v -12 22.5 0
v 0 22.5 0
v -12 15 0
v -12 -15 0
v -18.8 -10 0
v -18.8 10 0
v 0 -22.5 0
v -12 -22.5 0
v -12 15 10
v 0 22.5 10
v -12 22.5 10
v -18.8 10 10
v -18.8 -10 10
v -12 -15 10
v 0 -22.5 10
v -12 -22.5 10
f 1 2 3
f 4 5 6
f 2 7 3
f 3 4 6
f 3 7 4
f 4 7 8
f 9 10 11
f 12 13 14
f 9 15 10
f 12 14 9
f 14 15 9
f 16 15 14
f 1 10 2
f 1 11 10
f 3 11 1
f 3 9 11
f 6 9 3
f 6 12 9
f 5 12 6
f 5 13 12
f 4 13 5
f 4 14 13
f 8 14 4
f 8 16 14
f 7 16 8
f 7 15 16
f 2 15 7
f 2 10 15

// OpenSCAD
// file: dimensions.scad
//      +---------------------+
//      |                     |
//      |                     |
//      |                     |
//      |                     |
//      |                     |
//      |                     |
//      |                     |
//      |                     |
//      |                     |
//      |                     |
//   ^  |                     |
//   |  |                     |
//   Y  |                     |
//   |  |                     |
//   |  |                     |
//      +---------------------+
//       --  X (depth) --> 
// 

// the depth of the main body
depth = 11;

// the depth of the latch plate
latch_plate_depth = 3.25;

// the width of the enclosure for the human door side
hd_enclosure_width = 45;

// the depth of the enclosure for the human door side
hd_enclosure_depth = 10 * 2.5 + latch_plate_depth - 6;

// the width of the indoor overhang
overhang_indoor_width = 6;

// the width of the outdoor overhang
overhang_outdoor_width = 6;

// the total height
total_height = 50; // 290

// the width of the enclosure for the pet door side
pd_enclosure_width = 20 - 0.5;

// the depth of the enclosure for the pet door side
pd_enclosure_depth = 10;

seal_floor_offset = 12;
seal_small_width = 20;
seal_large_width = 30;
seal_depth = 6.8;

// the height of the track inset area
track_height = 18;

// the diameter of the track
track_diameter = 7;

// the height of the overhang
overhang_height = total_height - track_height;

// the total width
total_width = hd_enclosure_width + overhang_indoor_width + overhang_outdoor_width;

screw_body_clearance = 4.5;
screw_head_clearance = 9;
screw_body_depth = 10;
screw_angle_depth = 3;

// pins
pin_diameter = 5;
pin_length = 5;
// main file
include <dimensions.scad>

module full_seal3(l=20, falloff=false) {
  x0 = 0;
  x1 = -seal_floor_offset;
  x2 = -(seal_depth + seal_floor_offset);

  y0 = -seal_small_width / 2;
  y1 = seal_small_width / 2;
  y2 = -seal_large_width / 2;
  y3 = seal_large_width / 2;
  y4 = -hd_enclosure_width / 2;
  y5 = hd_enclosure_width / 2;

  z0 = 0;
  z1 = l;

  function zofx(x) = falloff ? 0 : z1;
  function xend(x) = falloff ? 1 : x;
  
  polyhedron(points=[[x0, y4, z0],
                     [x1, y4, z0],
                     [x1, y2, z0],
                     [x2, y0, z0],
                     [x2, y1, z0],
                     [x1, y3, z0],
                     [x1, y5, z0],
                     [x0, y5, z0],
                     [x0, y4, z1],
                     [x1, y4, z1],
                     [x1, y2, z1],
                     [x2, y0, z1],
                     [x2, y1, z1],
                     [x1, y3, z1],
                     [x1, y5, z1],
                     [x0, y5, z1]],
             faces=[
                    // extrusion faces
                    []
                    ]);
}

module full_seal(l=20, falloff=false) {
  x0 = 0;
  x1 = -seal_floor_offset;
  x2 = -(seal_depth + seal_floor_offset);

  y0 = -seal_small_width / 2;
  y1 = seal_small_width / 2;
  y2 = -seal_large_width / 2;
  y3 = seal_large_width / 2;
  y4 = -hd_enclosure_width / 2;
  y5 = hd_enclosure_width / 2;

  module poly() {
    polygon(points=[[x0, y4],
                    [x1, y4],
                    [x1, y2],
                    [x2, y0],
                    [x2, y1],
                    [x1, y3],
                    [x1, y5],
                    [x0, y5]]);
  }

  linear_extrude(height=l) poly();
}

full_seal(l=10, falloff=true);
